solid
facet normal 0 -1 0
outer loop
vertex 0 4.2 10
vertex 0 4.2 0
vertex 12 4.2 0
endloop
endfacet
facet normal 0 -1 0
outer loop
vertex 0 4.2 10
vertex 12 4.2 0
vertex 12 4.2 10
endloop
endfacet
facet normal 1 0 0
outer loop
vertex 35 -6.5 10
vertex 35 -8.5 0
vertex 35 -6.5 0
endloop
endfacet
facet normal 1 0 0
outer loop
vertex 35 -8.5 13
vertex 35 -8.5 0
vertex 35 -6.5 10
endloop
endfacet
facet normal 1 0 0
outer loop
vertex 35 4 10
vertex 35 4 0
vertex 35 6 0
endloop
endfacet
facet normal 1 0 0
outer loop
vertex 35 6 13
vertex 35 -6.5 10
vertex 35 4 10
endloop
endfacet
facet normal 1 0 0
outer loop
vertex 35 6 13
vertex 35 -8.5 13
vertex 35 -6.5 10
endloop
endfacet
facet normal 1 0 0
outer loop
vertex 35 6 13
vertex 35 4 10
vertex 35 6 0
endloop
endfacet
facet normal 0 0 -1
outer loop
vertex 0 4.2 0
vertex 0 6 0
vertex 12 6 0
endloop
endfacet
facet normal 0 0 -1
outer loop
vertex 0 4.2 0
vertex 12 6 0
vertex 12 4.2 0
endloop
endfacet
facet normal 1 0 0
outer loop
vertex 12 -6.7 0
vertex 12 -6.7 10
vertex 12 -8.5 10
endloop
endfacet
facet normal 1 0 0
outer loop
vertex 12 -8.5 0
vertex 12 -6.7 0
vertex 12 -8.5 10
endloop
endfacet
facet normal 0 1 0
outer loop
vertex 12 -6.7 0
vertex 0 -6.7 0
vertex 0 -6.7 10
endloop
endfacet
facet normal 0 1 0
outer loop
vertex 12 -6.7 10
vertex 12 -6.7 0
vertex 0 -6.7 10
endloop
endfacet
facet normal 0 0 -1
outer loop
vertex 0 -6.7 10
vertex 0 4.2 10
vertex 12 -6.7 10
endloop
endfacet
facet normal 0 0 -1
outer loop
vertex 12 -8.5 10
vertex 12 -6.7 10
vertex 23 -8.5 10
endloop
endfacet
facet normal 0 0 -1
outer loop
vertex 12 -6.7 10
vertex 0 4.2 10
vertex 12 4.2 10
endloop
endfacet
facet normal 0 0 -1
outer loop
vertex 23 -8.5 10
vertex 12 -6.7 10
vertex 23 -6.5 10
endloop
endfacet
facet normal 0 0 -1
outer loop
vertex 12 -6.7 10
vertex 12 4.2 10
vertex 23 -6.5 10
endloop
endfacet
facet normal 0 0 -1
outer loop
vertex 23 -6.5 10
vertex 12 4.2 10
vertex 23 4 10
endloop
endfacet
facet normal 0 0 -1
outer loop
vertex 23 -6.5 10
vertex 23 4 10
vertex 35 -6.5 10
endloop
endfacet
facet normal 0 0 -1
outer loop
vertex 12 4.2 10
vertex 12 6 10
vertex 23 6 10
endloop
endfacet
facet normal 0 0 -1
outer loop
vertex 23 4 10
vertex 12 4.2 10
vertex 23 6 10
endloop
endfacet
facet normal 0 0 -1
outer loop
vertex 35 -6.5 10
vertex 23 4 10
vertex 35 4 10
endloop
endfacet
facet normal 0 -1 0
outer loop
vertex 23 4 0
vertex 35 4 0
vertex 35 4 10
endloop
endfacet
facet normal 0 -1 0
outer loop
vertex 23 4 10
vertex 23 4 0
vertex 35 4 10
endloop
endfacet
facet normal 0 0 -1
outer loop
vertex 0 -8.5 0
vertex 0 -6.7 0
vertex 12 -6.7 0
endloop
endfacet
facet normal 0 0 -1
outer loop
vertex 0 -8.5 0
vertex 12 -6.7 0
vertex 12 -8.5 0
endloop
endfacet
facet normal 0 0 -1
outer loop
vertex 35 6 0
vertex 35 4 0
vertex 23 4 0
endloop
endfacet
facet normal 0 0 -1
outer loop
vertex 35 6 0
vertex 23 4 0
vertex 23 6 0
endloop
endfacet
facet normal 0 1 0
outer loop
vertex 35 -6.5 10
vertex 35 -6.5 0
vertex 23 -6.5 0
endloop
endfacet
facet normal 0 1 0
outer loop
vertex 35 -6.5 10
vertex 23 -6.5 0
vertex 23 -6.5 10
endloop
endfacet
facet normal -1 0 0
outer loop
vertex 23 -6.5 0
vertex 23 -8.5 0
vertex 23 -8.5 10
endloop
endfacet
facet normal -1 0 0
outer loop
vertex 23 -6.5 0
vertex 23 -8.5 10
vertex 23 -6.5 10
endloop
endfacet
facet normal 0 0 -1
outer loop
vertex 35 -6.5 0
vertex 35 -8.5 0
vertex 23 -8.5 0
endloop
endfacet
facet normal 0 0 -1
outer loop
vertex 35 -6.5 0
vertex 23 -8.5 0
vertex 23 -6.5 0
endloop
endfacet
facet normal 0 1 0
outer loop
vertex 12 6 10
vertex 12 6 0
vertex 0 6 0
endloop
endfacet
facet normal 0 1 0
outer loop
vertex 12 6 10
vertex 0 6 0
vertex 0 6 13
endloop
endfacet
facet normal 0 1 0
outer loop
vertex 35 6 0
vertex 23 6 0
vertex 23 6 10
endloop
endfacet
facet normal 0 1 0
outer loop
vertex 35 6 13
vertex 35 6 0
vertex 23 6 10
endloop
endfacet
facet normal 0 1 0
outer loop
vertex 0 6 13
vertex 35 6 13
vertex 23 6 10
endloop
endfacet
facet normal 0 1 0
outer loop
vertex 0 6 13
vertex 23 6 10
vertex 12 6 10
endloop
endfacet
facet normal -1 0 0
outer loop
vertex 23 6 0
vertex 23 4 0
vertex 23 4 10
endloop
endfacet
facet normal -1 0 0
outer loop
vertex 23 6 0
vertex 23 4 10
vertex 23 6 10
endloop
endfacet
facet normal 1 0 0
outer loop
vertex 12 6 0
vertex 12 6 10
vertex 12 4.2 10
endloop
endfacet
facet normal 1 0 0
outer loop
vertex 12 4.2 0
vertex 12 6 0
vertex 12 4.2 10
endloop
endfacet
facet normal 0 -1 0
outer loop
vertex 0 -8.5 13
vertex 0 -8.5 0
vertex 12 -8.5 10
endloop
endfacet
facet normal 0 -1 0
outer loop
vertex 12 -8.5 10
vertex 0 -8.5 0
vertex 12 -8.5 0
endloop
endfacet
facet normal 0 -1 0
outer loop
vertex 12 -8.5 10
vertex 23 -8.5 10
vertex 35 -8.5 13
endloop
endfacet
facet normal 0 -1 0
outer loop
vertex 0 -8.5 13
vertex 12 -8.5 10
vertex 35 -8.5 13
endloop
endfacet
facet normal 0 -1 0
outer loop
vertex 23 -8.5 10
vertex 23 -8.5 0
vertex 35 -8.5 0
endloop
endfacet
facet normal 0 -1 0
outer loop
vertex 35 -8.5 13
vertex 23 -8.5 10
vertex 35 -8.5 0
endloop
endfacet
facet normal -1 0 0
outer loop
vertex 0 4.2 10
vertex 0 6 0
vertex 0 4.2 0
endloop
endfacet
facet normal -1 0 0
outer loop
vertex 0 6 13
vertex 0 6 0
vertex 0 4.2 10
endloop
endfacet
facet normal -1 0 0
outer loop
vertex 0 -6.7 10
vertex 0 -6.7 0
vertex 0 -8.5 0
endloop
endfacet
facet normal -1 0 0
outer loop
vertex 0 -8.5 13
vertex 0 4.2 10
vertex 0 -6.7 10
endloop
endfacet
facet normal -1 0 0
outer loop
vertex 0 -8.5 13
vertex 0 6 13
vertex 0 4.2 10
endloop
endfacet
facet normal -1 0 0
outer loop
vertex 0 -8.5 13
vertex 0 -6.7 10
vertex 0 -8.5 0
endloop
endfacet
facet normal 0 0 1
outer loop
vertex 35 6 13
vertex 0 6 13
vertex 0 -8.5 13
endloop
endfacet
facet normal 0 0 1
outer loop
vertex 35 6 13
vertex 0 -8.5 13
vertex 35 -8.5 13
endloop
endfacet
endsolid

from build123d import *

# Parameters (mm, degrees)
BOX_W        = 35
BOX_H        = 14.5
BOX_DEPTH    = 3
SKETCH006_W  = 1.8
SKETCH006_H  = 10
PAD002_DEPTH = 12
SKETCH007_W  = 2
SKETCH007_H  = 10
PAD003_DEPTH = 12


with BuildPart() as part:
    # Box → Box (new body)
    with BuildSketch(Plane(origin=(0, -8.5, 10), x_dir=(1, 0, 0), z_dir=(0, 0, 1))):
        with Locations((17.5, 7.25)):
            Rectangle(BOX_W, BOX_H)
    extrude(amount=BOX_DEPTH)

    # Sketch006 → Pad002 (new body)
    with BuildSketch(Plane(origin=(0, -8.5, 10), x_dir=(0, -1, 0), z_dir=(-1, 0, 0))):
        with Locations((-13.6, -5)):
            Rectangle(SKETCH006_W, SKETCH006_H)
        with Locations((-0.9, -5)):
            Rectangle(SKETCH006_W, SKETCH006_H)
    extrude(amount=-PAD002_DEPTH)

    # Sketch007 → Pad003 (new body)
    with BuildSketch(Plane(origin=(35, -8.5, 10), x_dir=(0, 1, 0), z_dir=(1, 0, 0))):
        with Locations((13.5, -5)):
            Rectangle(SKETCH007_W, SKETCH007_H)
        with Locations((1, -5)):
            Rectangle(SKETCH007_W, SKETCH007_H)
    extrude(amount=-PAD003_DEPTH)


solid = part.part
